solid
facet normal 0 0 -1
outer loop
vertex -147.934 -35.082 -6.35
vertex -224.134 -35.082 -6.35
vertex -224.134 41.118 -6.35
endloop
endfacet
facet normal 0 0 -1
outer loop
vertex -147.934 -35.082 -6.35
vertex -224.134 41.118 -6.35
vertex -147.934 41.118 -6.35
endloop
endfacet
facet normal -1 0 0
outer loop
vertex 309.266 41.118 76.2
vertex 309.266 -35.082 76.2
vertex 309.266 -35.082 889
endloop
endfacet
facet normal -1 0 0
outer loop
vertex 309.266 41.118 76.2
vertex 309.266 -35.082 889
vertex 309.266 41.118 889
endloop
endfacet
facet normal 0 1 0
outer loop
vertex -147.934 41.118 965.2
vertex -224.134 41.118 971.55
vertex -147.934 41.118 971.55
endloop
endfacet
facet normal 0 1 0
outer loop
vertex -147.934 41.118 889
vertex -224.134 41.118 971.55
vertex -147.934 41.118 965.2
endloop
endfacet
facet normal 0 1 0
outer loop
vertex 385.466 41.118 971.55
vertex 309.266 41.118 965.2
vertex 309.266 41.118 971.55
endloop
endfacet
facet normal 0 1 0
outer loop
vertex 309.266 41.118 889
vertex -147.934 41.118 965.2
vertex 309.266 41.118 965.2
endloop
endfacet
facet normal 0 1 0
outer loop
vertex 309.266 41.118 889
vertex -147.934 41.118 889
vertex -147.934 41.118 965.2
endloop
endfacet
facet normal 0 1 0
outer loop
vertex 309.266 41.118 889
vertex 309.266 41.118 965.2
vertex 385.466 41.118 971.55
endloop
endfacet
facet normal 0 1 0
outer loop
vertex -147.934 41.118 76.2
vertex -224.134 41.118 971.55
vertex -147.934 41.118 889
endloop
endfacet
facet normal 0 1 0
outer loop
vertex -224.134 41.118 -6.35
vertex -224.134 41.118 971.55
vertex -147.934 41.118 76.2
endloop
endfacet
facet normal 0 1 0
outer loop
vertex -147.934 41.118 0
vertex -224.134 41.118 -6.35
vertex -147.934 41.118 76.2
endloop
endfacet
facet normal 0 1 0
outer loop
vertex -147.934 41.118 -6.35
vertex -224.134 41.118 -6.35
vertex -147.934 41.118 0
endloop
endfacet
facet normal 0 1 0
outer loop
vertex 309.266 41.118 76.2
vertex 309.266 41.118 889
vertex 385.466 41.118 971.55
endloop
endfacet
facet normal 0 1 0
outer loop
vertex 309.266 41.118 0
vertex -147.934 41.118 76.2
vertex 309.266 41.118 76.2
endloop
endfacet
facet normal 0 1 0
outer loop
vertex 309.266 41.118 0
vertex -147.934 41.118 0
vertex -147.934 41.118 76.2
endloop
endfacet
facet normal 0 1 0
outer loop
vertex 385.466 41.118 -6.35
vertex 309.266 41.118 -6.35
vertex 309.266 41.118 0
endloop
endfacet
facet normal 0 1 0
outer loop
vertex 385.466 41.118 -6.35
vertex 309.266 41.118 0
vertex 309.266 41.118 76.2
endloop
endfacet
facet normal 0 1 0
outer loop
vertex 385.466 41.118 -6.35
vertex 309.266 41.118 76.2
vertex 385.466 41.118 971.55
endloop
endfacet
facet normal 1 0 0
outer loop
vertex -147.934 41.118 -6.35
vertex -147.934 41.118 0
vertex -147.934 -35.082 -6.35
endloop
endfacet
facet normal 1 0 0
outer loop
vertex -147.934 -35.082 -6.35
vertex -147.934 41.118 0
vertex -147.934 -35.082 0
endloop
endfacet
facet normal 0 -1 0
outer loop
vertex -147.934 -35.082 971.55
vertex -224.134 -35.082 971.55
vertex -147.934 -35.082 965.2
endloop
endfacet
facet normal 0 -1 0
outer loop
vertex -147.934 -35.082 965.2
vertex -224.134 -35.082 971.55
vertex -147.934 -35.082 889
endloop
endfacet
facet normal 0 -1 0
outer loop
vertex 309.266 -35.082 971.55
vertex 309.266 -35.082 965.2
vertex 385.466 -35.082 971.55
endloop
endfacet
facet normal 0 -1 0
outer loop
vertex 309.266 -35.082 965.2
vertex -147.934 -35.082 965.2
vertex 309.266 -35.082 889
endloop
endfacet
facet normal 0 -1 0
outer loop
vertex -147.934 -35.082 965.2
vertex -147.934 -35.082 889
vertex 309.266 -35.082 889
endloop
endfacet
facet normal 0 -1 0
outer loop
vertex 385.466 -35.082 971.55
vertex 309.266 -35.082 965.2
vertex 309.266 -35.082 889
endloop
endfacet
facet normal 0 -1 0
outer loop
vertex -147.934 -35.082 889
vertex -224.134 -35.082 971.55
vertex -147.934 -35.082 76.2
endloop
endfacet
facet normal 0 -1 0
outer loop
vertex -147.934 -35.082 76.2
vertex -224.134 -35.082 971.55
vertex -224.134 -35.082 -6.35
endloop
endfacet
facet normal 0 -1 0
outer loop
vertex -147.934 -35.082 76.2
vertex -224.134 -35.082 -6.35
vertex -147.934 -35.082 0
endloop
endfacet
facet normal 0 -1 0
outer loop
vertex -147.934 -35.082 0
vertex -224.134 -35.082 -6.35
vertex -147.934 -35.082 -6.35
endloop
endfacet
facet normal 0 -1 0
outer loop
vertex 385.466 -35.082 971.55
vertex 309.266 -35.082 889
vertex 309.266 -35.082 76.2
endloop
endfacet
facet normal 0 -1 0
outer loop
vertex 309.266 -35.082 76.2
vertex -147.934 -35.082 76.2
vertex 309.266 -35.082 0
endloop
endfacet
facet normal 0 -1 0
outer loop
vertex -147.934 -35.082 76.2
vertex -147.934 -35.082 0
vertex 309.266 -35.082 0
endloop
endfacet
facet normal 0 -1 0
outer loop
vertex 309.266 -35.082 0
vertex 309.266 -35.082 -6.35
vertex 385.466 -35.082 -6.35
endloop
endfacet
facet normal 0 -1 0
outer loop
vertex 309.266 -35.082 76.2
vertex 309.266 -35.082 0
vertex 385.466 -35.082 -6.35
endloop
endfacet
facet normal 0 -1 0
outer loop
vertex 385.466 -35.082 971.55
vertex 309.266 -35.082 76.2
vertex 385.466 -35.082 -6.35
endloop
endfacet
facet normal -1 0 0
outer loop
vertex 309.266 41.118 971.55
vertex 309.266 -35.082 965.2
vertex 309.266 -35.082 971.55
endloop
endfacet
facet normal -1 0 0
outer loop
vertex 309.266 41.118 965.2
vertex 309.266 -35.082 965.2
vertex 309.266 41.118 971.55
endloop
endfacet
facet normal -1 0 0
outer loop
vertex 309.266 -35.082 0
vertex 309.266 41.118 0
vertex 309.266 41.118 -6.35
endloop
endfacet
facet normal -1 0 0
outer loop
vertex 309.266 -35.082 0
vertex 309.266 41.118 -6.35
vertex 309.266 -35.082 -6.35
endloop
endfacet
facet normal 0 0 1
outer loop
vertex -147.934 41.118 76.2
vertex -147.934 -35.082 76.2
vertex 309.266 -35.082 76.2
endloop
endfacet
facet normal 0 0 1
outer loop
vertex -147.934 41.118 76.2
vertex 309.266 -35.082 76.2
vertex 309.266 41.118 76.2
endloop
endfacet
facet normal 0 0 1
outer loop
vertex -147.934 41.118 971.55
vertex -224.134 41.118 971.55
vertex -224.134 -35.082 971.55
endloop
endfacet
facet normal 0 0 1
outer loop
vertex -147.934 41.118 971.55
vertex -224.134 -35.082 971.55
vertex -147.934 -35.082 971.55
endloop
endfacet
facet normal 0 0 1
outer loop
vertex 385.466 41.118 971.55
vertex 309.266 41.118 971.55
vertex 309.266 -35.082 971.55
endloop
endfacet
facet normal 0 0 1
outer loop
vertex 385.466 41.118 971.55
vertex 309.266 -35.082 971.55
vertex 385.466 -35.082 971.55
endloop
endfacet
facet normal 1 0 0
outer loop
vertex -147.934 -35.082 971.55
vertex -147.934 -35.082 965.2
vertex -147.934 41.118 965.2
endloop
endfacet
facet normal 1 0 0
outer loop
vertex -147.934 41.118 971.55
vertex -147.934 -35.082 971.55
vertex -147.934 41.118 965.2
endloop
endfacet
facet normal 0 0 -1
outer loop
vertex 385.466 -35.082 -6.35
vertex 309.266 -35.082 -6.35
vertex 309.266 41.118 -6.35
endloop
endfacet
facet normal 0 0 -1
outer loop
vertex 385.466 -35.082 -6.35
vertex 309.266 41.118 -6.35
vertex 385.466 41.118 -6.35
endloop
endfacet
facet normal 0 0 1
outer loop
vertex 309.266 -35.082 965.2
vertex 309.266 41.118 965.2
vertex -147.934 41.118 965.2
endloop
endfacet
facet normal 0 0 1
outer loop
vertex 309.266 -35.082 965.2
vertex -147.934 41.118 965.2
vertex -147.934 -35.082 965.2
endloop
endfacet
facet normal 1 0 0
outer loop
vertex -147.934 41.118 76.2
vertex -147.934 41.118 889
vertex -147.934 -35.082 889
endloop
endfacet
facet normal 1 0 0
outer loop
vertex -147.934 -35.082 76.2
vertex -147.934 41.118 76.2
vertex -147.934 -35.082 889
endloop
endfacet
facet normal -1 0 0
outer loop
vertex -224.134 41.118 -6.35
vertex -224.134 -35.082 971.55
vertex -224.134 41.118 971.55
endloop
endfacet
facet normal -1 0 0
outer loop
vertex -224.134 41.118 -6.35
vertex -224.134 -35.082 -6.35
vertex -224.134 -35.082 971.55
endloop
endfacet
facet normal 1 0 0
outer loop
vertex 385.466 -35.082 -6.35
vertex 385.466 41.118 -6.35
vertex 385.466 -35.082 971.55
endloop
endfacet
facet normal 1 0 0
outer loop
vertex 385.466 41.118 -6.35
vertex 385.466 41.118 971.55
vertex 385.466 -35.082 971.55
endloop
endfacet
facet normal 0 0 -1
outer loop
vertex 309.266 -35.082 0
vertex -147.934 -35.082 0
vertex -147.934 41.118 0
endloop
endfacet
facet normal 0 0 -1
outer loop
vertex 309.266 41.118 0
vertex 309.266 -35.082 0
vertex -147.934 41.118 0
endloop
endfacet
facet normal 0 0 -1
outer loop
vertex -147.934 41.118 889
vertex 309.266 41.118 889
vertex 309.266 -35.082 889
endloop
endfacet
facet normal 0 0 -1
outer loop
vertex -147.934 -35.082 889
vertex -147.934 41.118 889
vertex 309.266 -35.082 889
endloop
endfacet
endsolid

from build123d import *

# Parameters (mm, degrees)
F0_W      = 457.2
F0_H      = 76.2
F1_DEPTH  = 76.2
F1_FACE_W = 76.2
F1_FACE_H = 76.2
F2_DEPTH  = 152.4
F3_W      = 76.2
F3_H      = 76.2
F4_DEPTH  = 895.35
F5_W      = 76.2
F5_H      = 76.2
F11_DEPTH = 6.35
F6_W      = 76.2
F6_H      = 76.2
F7_DEPTH  = 533.4
F8_W      = 76.2
F8_H      = 76.2
F12_DEPTH = 895.35
F9_W      = 76.2
F9_H      = 76.2
F10_DEPTH = 6.35


with BuildPart() as f1:
    # F0 (on Top) → F1 (new body)
    with BuildSketch(Plane.XY):
        with Locations((4.465946, 3.0175)):
            Rectangle(F0_W, F0_H)
    extrude(amount=F1_DEPTH)

    # F1_face (on face) → F2 (join)
    with BuildSketch(Plane(origin=(233.065946, 3.0175, 38.1), x_dir=(0, 1, 0), z_dir=(1, 0, 0))):
        Rectangle(F1_FACE_W, F1_FACE_H)
    extrude(amount=F2_DEPTH)

    # F3 (on face) → F4 (join)
    with BuildSketch(Plane.XY.offset(76.2)):
        with Locations((347.365946, 3.0175)):
            Rectangle(F3_W, F3_H)
    extrude(amount=F4_DEPTH)

    # F5 (on face) → F11 (join)
    with BuildSketch(Plane(origin=(0, 0, 0), x_dir=(1, 0, 0), z_dir=(0, 0, -1))):
        with Locations((347.365946, -3.0175)):
            Rectangle(F5_W, F5_H)
    extrude(amount=F11_DEPTH)

    # F6 (on face) → F7 (join)
    with BuildSketch(Plane(origin=(309.265946, 0, 0), x_dir=(0, -1, 0), z_dir=(-1, 0, 0))):
        with Locations((-3.0175, 927.1)):
            Rectangle(F6_W, F6_H)
    extrude(amount=F7_DEPTH)

    # F8 (on face) → F12 (join)
    with BuildSketch(Plane(origin=(0, 0, 889), x_dir=(1, 0, 0), z_dir=(0, 0, -1))):
        with Locations((-186.034054, -3.0175)):
            Rectangle(F8_W, F8_H)
    extrude(amount=F12_DEPTH)

    # F9 (on face) → F10 (join)
    with BuildSketch(Plane.XY.offset(965.2)):
        with Locations((-186.034054, 3.0175)):
            Rectangle(F9_W, F9_H)
    extrude(amount=F10_DEPTH)


solid = f1.part
